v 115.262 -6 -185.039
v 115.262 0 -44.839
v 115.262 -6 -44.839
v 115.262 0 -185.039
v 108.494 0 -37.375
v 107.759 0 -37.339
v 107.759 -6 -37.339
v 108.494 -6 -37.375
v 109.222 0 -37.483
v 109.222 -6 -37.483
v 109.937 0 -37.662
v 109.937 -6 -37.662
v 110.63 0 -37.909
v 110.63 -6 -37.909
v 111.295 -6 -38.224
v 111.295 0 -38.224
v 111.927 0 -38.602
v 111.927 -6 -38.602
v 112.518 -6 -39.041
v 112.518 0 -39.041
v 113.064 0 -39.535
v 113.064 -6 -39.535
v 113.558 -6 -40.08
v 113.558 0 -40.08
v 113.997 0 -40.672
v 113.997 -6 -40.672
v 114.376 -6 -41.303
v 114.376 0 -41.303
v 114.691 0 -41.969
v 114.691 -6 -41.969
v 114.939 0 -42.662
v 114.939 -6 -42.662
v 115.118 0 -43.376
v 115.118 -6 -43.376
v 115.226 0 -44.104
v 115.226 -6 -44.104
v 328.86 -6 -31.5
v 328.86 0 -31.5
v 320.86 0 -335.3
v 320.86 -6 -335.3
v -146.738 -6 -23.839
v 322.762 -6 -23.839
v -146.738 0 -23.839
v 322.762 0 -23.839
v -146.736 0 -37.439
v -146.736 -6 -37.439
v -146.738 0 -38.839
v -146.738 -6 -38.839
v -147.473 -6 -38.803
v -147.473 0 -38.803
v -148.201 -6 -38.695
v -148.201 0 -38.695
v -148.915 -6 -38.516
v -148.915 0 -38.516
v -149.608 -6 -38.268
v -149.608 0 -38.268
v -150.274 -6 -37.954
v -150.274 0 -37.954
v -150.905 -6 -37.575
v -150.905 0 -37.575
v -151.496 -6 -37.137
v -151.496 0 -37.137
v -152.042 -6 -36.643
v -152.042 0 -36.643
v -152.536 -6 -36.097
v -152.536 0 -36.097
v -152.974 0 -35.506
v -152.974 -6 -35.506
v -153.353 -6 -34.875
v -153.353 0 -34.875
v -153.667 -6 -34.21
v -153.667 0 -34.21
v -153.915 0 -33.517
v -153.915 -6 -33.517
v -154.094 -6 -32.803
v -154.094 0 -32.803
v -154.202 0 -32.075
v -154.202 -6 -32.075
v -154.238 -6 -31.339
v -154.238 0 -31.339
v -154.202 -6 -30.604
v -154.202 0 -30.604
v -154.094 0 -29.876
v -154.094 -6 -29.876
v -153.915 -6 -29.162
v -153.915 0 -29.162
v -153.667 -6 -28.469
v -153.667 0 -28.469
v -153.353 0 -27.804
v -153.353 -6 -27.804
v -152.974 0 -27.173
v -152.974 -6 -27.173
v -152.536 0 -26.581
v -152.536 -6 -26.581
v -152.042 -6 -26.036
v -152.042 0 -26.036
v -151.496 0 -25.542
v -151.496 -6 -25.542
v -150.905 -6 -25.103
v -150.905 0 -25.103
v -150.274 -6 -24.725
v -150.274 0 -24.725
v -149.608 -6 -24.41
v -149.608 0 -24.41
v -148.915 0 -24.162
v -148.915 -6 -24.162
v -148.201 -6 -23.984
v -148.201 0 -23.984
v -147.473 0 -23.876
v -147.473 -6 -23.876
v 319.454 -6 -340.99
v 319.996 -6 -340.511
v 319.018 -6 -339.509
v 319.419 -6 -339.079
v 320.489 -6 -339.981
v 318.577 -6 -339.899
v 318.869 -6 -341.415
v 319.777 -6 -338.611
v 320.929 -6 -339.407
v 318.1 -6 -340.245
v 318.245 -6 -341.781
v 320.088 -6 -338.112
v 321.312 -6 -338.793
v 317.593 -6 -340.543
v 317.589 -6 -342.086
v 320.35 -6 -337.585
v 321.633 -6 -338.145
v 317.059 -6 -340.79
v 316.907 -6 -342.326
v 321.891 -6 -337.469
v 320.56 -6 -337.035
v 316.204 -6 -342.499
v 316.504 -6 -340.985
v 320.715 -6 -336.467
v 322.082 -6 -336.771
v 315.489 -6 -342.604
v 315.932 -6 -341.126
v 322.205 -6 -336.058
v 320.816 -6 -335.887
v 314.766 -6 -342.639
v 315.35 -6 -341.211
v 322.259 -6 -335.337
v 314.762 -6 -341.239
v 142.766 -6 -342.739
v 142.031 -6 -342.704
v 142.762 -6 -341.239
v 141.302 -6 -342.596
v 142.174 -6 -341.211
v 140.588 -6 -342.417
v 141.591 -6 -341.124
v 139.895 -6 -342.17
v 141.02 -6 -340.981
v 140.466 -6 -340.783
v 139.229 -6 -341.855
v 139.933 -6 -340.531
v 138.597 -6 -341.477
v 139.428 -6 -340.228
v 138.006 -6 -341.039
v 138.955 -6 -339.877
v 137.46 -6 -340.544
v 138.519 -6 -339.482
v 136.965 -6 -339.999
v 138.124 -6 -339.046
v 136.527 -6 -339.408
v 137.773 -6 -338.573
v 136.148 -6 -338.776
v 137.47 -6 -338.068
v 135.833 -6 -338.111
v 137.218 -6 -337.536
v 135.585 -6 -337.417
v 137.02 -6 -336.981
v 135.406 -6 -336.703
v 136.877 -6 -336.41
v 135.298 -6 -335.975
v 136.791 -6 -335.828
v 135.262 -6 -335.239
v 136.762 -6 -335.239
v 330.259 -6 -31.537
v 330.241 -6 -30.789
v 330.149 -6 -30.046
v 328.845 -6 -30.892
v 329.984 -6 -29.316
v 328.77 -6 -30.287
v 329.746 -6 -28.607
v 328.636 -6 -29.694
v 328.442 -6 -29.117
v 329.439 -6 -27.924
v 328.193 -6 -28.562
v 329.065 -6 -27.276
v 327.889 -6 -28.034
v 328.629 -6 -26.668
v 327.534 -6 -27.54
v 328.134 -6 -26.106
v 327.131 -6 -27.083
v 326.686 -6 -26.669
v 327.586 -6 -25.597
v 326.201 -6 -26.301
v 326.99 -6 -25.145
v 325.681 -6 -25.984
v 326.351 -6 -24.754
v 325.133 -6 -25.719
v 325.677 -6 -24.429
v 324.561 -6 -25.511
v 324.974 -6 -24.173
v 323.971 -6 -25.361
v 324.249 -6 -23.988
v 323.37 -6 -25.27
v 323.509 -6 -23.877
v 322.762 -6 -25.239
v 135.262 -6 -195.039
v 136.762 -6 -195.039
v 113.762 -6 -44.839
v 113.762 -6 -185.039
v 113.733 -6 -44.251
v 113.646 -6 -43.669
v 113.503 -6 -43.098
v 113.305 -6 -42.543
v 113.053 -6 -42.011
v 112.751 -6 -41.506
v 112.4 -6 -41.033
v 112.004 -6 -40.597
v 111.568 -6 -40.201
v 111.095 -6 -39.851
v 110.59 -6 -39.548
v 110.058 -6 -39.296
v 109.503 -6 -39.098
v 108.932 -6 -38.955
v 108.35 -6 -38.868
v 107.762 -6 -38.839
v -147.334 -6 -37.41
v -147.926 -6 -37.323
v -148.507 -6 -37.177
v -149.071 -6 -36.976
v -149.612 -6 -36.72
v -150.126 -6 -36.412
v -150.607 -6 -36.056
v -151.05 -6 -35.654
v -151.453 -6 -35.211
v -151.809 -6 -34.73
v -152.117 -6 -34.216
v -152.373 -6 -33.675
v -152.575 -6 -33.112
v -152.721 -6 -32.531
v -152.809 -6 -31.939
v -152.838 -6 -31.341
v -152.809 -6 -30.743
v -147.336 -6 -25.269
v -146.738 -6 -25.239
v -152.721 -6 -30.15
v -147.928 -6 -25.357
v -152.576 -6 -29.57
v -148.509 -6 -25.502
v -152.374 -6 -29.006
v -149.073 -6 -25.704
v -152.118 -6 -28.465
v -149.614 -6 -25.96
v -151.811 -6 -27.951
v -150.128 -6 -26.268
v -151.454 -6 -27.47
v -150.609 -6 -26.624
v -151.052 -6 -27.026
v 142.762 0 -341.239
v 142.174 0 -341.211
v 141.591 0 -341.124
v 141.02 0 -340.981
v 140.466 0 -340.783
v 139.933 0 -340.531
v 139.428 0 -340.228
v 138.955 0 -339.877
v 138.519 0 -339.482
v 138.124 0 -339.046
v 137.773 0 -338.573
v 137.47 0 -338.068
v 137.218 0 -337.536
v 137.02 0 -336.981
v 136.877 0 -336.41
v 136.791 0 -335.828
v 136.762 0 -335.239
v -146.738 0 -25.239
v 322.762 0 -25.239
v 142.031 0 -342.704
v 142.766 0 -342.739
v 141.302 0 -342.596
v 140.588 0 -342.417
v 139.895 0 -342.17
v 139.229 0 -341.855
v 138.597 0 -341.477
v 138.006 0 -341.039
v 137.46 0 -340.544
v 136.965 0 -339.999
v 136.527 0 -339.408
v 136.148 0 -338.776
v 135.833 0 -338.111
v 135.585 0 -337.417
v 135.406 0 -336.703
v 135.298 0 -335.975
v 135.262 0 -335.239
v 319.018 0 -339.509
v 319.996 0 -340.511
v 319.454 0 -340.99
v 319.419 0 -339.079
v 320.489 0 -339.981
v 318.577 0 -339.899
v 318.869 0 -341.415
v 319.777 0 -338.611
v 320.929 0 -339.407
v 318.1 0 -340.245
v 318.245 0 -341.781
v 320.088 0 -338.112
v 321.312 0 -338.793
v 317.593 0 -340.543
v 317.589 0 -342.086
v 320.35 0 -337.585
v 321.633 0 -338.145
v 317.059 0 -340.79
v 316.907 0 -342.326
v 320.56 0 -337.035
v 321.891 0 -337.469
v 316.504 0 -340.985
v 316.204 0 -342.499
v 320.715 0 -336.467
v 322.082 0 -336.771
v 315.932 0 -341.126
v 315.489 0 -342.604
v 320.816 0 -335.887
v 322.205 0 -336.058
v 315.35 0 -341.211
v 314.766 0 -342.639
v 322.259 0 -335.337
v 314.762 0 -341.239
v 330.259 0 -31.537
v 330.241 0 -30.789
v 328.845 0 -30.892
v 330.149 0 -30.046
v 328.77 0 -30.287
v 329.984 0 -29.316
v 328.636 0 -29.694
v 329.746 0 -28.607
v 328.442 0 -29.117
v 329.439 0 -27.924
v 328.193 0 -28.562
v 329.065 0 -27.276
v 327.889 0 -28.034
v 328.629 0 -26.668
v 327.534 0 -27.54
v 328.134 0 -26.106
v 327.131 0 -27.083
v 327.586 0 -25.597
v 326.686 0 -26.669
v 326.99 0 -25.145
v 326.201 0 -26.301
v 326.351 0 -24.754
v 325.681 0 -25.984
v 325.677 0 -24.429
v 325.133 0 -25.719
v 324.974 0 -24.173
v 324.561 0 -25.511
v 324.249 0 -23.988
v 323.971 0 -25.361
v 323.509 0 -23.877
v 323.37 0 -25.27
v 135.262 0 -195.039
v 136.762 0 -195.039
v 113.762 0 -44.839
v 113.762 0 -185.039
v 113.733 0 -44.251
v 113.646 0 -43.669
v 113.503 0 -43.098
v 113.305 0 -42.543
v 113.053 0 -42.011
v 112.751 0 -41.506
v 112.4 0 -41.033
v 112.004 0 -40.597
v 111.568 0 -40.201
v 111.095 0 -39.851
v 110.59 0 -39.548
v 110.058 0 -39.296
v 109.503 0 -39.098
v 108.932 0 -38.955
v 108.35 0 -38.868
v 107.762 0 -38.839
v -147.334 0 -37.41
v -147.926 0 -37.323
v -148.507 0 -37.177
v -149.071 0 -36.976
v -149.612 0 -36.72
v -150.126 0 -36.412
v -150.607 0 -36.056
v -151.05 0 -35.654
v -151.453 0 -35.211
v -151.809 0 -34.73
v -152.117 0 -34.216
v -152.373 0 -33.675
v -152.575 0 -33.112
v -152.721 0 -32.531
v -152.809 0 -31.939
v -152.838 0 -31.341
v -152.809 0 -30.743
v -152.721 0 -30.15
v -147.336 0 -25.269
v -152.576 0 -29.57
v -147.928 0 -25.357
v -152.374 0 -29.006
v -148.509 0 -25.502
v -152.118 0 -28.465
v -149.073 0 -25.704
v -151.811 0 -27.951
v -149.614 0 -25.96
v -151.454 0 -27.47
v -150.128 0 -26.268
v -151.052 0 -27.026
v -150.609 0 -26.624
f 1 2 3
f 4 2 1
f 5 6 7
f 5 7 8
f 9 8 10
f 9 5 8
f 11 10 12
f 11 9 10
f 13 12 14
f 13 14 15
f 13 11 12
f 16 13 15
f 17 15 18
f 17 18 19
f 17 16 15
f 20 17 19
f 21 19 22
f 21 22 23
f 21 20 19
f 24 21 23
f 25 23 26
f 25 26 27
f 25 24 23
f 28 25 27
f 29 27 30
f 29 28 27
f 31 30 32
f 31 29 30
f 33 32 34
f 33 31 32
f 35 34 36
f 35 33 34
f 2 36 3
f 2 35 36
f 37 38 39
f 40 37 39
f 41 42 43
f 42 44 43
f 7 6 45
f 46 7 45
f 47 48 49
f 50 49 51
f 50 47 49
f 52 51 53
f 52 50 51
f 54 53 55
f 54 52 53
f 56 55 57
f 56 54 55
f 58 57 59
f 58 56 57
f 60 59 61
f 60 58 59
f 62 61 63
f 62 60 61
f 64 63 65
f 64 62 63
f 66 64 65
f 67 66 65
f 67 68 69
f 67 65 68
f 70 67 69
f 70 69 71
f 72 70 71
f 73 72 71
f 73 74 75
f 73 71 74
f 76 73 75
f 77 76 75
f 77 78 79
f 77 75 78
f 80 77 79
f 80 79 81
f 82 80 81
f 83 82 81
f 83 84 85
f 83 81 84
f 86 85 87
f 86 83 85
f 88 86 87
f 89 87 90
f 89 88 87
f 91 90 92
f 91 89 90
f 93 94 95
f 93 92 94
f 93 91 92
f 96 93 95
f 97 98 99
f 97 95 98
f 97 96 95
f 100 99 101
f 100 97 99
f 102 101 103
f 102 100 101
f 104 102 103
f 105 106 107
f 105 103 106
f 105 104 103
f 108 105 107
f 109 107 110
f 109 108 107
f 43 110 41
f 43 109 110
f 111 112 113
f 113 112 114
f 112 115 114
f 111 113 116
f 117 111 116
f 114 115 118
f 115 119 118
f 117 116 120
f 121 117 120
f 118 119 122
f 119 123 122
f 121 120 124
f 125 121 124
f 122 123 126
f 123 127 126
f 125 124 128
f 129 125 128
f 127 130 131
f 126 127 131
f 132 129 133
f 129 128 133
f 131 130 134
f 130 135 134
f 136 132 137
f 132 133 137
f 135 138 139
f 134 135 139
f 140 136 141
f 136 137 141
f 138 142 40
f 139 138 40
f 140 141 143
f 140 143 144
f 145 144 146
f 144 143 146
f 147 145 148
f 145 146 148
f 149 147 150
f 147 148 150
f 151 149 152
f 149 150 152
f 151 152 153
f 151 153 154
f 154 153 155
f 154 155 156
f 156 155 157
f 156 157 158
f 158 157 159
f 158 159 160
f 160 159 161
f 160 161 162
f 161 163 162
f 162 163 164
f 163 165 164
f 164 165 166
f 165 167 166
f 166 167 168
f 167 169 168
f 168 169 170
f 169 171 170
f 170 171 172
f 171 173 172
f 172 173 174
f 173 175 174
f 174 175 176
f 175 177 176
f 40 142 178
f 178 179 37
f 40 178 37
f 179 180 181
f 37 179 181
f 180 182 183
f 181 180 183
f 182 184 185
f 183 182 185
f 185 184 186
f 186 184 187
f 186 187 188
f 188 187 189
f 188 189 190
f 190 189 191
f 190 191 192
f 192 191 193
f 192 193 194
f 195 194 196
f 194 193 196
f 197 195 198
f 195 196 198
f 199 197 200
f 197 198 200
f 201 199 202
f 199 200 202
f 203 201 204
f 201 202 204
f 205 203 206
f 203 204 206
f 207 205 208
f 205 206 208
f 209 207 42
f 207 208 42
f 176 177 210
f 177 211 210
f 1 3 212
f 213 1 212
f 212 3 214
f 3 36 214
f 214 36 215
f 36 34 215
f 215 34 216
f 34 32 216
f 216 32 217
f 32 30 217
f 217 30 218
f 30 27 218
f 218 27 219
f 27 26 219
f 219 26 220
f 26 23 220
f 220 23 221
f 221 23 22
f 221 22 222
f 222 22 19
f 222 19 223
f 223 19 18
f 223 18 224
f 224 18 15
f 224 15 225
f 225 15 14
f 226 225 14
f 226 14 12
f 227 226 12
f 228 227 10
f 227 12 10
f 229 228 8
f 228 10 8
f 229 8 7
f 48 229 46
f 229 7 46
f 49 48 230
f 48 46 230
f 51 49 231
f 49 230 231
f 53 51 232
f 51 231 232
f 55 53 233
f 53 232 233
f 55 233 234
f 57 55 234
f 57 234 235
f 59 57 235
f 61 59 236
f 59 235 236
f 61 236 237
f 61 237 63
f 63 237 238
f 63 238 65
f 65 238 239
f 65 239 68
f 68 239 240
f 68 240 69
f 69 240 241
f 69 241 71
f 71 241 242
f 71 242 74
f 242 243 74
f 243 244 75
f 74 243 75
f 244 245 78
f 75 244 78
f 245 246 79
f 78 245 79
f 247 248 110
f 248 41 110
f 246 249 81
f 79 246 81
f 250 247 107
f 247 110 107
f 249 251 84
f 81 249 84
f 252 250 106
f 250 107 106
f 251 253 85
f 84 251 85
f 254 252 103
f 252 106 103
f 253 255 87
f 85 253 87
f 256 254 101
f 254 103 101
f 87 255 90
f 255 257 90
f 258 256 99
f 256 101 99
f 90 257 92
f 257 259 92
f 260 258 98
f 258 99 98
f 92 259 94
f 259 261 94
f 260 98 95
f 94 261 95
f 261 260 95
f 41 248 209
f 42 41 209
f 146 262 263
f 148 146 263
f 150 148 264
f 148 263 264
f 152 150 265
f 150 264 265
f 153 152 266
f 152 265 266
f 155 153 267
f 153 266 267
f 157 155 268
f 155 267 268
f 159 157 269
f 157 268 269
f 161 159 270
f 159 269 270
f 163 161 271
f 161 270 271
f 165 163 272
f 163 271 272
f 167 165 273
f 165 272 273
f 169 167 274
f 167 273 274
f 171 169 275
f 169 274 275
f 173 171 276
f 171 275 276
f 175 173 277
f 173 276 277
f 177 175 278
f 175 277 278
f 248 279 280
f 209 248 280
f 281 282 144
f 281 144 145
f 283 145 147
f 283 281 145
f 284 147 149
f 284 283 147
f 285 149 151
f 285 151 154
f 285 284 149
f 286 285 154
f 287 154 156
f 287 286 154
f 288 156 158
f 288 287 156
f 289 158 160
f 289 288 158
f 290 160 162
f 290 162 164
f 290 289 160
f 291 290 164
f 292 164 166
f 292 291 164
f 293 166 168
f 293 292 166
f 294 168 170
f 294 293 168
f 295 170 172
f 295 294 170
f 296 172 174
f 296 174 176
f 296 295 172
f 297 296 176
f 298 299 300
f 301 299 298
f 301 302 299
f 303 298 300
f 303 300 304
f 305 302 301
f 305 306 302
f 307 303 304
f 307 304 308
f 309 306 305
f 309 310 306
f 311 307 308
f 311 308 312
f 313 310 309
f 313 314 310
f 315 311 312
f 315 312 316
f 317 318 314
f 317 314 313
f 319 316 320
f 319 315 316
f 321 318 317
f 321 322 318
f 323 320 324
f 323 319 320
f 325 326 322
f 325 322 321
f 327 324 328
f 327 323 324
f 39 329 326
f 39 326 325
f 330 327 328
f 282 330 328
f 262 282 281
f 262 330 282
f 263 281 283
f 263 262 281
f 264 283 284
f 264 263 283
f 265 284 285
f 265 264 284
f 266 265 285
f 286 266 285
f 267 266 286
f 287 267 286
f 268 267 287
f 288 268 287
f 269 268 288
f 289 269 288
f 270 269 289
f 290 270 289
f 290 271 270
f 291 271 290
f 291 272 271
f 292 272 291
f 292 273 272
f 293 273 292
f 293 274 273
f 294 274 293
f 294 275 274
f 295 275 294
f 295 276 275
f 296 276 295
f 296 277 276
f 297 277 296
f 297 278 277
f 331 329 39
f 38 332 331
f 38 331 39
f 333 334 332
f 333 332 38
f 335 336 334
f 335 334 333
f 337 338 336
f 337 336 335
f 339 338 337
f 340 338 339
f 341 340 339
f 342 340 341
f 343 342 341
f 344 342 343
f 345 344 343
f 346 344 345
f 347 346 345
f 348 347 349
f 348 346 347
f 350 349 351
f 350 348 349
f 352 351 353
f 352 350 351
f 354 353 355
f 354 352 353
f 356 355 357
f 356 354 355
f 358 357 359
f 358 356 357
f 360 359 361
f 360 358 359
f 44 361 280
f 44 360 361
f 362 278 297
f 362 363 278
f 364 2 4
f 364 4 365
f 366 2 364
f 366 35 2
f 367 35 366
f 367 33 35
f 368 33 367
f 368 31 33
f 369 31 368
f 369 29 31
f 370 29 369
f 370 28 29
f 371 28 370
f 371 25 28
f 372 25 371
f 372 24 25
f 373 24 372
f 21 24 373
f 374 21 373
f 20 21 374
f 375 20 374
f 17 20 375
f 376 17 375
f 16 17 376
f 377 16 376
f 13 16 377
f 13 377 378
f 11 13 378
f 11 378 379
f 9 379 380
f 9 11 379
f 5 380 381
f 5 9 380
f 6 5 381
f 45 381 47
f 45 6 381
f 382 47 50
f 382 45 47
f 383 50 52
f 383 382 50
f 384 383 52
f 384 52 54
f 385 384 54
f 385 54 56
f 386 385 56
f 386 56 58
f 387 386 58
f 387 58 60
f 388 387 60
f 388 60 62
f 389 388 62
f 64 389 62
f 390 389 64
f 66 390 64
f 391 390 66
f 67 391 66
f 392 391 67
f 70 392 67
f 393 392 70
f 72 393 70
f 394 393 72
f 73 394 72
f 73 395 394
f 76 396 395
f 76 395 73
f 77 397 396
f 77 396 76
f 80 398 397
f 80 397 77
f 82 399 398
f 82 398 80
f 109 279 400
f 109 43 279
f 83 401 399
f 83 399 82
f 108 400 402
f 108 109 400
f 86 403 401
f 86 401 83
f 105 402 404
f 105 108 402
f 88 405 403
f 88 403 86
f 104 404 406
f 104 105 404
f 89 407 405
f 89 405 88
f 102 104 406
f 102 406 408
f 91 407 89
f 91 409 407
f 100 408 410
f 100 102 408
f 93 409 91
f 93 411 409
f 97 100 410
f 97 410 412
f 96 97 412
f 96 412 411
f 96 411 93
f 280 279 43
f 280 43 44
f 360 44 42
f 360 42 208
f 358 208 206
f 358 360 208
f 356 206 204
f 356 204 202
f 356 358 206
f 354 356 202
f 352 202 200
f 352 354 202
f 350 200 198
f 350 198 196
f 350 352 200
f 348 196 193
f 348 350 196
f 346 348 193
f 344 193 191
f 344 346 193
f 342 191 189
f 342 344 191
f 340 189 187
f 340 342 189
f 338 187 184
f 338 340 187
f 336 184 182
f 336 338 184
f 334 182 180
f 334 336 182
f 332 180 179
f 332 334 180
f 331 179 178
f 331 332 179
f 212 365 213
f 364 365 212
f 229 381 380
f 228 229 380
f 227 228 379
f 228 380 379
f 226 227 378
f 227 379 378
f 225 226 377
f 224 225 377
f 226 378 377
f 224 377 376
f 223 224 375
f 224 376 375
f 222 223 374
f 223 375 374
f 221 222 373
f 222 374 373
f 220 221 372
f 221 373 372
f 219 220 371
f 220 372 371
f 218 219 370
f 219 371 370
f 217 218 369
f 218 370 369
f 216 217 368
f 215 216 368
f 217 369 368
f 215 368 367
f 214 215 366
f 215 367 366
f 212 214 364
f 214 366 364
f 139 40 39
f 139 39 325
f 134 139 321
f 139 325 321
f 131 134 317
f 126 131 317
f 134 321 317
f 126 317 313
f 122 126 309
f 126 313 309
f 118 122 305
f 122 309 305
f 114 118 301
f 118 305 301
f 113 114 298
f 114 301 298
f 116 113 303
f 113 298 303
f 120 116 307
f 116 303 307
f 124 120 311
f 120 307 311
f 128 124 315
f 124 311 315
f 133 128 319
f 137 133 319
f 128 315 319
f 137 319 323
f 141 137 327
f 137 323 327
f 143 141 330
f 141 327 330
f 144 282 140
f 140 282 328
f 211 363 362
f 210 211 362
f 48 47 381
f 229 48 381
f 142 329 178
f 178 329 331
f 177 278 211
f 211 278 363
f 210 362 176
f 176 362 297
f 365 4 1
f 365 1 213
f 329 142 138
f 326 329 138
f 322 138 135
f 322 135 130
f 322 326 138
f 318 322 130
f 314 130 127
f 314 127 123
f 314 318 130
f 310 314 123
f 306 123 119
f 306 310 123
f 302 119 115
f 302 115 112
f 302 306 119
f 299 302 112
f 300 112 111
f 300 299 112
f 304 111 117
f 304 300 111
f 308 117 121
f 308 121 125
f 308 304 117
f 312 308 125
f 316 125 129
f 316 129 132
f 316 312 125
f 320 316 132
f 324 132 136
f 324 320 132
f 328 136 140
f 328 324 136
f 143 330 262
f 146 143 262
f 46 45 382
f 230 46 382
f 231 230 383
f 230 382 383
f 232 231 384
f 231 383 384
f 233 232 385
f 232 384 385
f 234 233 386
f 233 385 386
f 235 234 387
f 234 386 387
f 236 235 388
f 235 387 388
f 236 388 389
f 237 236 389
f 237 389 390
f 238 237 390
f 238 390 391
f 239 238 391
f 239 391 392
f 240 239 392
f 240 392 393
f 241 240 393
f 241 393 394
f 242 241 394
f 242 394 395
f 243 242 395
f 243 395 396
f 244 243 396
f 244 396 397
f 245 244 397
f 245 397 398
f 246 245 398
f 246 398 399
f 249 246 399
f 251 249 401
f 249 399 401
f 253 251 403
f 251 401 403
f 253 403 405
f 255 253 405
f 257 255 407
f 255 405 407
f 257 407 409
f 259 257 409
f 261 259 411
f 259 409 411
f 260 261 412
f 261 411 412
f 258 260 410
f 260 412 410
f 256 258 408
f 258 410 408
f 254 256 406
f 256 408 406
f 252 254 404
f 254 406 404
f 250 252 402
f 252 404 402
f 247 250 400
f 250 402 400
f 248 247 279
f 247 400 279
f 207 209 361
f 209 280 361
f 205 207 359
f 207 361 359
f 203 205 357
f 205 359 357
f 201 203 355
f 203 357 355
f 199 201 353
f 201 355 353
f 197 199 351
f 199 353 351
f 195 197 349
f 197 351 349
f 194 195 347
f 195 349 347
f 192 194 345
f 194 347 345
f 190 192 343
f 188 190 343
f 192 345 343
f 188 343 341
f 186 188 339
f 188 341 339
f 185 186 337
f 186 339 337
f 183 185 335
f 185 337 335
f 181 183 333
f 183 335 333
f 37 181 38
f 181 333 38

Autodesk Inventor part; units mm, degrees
ref_plane "YZ Plane" through (0, 0, 0) normal (1, 0, 0) x (0, 1, 0)
ref_plane "XZ Plane" through (0, 0, 0) normal (0, 1, 0) x (-1, 0, 0)
ref_plane "XY Plane" through (0, 0, 0) normal (0, 0, 1) x (1, 0, 0)
sketch "Sketch1" plane through (0, 0, 0) normal (0, 1, 0) x (-1, 0, 0)
  circle A0 centre (146.7383, -31.3394) radius 6.1 projected
  circle A1 centre (146.7383, -31.3394) radius 7.5 projected
  circle A2 centre (-107.7617, -44.8394) radius 7.5 projected
  circle A3 centre (-107.7617, -44.8394) radius 6 projected
  circle A4 centre (-142.7617, -335.2394) radius 7.5 projected
  circle A5 centre (-142.7617, -335.2394) radius 6 projected
  circle A6 centre (-314.7617, -335.1394) radius 7.5 projected
  circle A7 centre (-314.7617, -335.1394) radius 6.1 projected
  circle A8 centre (-322.7617, -31.3394) radius 7.5 projected
  circle A9 centre (-322.7617, -31.3394) radius 6.1 projected
  line L0 (-322.7617, -23.8394) -> (146.7383, -23.8394)
  line L1 (146.7383, -38.8394) -> (-107.7617, -38.8394)
  line L2 (-107.7587, -37.3394) -> (146.7359, -37.4394)
  line L3 (146.7383, -25.2394) -> (-322.7617, -25.2394)
  line L4 (-328.8595, -31.5) -> (-320.8595, -335.3)
  line L5 (-322.2591, -335.3369) -> (-330.2591, -31.5369)
  line L6 (-314.7617, -341.2394) -> (-142.7617, -341.2394)
  line L7 (-142.766, -342.7394) -> (-314.766, -342.6394)
  line L8 (-115.2617, -44.8394) -> (-115.2617, -185.0394)
  line L9 (-115.2617, -185.0394) -> (-113.7617, -185.0394)
  line L10 (-113.7617, -185.0394) -> (-113.7617, -44.8394)
  line L11 (-136.7617, -335.2394) -> (-136.7617, -195.0394)
  line L12 (-136.7617, -195.0394) -> (-135.2617, -195.0394)
  line L13 (-135.2617, -195.0394) -> (-135.2617, -335.2394)
  arc A10 (-100.7617, -192.5394) -> (-100.7617, -187.5394) centre (-96.4315, -190.0394) ccw
  point P0 (0, 0)
  point P1 (-147.2617, -341.2394)
extrude "Extrusion1" add sketch "Sketch1" against normal blind 6 contours A0 L3 A1 L2 | L3 A8 L0 A1 | A1 L1 A2 L2 | L3 A9 L4 A8 | A2 L1 A3 L10 | A2 L10 L9 L8 | A8 L4 A6 L5 | A6 L4 A7 L6 | A6 L6 A4 L7 | A4 L6 A5 L11 | A4 L11 L12 L13 picked at (144.276, -37.6941) picked at (-329.0502, -33.966) picked at (-114.0352, -47.3793) picked at (-312.3021, -341.4951) picked at (-136.4882, -332.6995)
properties part number "Belt_1" material "Rubber"
